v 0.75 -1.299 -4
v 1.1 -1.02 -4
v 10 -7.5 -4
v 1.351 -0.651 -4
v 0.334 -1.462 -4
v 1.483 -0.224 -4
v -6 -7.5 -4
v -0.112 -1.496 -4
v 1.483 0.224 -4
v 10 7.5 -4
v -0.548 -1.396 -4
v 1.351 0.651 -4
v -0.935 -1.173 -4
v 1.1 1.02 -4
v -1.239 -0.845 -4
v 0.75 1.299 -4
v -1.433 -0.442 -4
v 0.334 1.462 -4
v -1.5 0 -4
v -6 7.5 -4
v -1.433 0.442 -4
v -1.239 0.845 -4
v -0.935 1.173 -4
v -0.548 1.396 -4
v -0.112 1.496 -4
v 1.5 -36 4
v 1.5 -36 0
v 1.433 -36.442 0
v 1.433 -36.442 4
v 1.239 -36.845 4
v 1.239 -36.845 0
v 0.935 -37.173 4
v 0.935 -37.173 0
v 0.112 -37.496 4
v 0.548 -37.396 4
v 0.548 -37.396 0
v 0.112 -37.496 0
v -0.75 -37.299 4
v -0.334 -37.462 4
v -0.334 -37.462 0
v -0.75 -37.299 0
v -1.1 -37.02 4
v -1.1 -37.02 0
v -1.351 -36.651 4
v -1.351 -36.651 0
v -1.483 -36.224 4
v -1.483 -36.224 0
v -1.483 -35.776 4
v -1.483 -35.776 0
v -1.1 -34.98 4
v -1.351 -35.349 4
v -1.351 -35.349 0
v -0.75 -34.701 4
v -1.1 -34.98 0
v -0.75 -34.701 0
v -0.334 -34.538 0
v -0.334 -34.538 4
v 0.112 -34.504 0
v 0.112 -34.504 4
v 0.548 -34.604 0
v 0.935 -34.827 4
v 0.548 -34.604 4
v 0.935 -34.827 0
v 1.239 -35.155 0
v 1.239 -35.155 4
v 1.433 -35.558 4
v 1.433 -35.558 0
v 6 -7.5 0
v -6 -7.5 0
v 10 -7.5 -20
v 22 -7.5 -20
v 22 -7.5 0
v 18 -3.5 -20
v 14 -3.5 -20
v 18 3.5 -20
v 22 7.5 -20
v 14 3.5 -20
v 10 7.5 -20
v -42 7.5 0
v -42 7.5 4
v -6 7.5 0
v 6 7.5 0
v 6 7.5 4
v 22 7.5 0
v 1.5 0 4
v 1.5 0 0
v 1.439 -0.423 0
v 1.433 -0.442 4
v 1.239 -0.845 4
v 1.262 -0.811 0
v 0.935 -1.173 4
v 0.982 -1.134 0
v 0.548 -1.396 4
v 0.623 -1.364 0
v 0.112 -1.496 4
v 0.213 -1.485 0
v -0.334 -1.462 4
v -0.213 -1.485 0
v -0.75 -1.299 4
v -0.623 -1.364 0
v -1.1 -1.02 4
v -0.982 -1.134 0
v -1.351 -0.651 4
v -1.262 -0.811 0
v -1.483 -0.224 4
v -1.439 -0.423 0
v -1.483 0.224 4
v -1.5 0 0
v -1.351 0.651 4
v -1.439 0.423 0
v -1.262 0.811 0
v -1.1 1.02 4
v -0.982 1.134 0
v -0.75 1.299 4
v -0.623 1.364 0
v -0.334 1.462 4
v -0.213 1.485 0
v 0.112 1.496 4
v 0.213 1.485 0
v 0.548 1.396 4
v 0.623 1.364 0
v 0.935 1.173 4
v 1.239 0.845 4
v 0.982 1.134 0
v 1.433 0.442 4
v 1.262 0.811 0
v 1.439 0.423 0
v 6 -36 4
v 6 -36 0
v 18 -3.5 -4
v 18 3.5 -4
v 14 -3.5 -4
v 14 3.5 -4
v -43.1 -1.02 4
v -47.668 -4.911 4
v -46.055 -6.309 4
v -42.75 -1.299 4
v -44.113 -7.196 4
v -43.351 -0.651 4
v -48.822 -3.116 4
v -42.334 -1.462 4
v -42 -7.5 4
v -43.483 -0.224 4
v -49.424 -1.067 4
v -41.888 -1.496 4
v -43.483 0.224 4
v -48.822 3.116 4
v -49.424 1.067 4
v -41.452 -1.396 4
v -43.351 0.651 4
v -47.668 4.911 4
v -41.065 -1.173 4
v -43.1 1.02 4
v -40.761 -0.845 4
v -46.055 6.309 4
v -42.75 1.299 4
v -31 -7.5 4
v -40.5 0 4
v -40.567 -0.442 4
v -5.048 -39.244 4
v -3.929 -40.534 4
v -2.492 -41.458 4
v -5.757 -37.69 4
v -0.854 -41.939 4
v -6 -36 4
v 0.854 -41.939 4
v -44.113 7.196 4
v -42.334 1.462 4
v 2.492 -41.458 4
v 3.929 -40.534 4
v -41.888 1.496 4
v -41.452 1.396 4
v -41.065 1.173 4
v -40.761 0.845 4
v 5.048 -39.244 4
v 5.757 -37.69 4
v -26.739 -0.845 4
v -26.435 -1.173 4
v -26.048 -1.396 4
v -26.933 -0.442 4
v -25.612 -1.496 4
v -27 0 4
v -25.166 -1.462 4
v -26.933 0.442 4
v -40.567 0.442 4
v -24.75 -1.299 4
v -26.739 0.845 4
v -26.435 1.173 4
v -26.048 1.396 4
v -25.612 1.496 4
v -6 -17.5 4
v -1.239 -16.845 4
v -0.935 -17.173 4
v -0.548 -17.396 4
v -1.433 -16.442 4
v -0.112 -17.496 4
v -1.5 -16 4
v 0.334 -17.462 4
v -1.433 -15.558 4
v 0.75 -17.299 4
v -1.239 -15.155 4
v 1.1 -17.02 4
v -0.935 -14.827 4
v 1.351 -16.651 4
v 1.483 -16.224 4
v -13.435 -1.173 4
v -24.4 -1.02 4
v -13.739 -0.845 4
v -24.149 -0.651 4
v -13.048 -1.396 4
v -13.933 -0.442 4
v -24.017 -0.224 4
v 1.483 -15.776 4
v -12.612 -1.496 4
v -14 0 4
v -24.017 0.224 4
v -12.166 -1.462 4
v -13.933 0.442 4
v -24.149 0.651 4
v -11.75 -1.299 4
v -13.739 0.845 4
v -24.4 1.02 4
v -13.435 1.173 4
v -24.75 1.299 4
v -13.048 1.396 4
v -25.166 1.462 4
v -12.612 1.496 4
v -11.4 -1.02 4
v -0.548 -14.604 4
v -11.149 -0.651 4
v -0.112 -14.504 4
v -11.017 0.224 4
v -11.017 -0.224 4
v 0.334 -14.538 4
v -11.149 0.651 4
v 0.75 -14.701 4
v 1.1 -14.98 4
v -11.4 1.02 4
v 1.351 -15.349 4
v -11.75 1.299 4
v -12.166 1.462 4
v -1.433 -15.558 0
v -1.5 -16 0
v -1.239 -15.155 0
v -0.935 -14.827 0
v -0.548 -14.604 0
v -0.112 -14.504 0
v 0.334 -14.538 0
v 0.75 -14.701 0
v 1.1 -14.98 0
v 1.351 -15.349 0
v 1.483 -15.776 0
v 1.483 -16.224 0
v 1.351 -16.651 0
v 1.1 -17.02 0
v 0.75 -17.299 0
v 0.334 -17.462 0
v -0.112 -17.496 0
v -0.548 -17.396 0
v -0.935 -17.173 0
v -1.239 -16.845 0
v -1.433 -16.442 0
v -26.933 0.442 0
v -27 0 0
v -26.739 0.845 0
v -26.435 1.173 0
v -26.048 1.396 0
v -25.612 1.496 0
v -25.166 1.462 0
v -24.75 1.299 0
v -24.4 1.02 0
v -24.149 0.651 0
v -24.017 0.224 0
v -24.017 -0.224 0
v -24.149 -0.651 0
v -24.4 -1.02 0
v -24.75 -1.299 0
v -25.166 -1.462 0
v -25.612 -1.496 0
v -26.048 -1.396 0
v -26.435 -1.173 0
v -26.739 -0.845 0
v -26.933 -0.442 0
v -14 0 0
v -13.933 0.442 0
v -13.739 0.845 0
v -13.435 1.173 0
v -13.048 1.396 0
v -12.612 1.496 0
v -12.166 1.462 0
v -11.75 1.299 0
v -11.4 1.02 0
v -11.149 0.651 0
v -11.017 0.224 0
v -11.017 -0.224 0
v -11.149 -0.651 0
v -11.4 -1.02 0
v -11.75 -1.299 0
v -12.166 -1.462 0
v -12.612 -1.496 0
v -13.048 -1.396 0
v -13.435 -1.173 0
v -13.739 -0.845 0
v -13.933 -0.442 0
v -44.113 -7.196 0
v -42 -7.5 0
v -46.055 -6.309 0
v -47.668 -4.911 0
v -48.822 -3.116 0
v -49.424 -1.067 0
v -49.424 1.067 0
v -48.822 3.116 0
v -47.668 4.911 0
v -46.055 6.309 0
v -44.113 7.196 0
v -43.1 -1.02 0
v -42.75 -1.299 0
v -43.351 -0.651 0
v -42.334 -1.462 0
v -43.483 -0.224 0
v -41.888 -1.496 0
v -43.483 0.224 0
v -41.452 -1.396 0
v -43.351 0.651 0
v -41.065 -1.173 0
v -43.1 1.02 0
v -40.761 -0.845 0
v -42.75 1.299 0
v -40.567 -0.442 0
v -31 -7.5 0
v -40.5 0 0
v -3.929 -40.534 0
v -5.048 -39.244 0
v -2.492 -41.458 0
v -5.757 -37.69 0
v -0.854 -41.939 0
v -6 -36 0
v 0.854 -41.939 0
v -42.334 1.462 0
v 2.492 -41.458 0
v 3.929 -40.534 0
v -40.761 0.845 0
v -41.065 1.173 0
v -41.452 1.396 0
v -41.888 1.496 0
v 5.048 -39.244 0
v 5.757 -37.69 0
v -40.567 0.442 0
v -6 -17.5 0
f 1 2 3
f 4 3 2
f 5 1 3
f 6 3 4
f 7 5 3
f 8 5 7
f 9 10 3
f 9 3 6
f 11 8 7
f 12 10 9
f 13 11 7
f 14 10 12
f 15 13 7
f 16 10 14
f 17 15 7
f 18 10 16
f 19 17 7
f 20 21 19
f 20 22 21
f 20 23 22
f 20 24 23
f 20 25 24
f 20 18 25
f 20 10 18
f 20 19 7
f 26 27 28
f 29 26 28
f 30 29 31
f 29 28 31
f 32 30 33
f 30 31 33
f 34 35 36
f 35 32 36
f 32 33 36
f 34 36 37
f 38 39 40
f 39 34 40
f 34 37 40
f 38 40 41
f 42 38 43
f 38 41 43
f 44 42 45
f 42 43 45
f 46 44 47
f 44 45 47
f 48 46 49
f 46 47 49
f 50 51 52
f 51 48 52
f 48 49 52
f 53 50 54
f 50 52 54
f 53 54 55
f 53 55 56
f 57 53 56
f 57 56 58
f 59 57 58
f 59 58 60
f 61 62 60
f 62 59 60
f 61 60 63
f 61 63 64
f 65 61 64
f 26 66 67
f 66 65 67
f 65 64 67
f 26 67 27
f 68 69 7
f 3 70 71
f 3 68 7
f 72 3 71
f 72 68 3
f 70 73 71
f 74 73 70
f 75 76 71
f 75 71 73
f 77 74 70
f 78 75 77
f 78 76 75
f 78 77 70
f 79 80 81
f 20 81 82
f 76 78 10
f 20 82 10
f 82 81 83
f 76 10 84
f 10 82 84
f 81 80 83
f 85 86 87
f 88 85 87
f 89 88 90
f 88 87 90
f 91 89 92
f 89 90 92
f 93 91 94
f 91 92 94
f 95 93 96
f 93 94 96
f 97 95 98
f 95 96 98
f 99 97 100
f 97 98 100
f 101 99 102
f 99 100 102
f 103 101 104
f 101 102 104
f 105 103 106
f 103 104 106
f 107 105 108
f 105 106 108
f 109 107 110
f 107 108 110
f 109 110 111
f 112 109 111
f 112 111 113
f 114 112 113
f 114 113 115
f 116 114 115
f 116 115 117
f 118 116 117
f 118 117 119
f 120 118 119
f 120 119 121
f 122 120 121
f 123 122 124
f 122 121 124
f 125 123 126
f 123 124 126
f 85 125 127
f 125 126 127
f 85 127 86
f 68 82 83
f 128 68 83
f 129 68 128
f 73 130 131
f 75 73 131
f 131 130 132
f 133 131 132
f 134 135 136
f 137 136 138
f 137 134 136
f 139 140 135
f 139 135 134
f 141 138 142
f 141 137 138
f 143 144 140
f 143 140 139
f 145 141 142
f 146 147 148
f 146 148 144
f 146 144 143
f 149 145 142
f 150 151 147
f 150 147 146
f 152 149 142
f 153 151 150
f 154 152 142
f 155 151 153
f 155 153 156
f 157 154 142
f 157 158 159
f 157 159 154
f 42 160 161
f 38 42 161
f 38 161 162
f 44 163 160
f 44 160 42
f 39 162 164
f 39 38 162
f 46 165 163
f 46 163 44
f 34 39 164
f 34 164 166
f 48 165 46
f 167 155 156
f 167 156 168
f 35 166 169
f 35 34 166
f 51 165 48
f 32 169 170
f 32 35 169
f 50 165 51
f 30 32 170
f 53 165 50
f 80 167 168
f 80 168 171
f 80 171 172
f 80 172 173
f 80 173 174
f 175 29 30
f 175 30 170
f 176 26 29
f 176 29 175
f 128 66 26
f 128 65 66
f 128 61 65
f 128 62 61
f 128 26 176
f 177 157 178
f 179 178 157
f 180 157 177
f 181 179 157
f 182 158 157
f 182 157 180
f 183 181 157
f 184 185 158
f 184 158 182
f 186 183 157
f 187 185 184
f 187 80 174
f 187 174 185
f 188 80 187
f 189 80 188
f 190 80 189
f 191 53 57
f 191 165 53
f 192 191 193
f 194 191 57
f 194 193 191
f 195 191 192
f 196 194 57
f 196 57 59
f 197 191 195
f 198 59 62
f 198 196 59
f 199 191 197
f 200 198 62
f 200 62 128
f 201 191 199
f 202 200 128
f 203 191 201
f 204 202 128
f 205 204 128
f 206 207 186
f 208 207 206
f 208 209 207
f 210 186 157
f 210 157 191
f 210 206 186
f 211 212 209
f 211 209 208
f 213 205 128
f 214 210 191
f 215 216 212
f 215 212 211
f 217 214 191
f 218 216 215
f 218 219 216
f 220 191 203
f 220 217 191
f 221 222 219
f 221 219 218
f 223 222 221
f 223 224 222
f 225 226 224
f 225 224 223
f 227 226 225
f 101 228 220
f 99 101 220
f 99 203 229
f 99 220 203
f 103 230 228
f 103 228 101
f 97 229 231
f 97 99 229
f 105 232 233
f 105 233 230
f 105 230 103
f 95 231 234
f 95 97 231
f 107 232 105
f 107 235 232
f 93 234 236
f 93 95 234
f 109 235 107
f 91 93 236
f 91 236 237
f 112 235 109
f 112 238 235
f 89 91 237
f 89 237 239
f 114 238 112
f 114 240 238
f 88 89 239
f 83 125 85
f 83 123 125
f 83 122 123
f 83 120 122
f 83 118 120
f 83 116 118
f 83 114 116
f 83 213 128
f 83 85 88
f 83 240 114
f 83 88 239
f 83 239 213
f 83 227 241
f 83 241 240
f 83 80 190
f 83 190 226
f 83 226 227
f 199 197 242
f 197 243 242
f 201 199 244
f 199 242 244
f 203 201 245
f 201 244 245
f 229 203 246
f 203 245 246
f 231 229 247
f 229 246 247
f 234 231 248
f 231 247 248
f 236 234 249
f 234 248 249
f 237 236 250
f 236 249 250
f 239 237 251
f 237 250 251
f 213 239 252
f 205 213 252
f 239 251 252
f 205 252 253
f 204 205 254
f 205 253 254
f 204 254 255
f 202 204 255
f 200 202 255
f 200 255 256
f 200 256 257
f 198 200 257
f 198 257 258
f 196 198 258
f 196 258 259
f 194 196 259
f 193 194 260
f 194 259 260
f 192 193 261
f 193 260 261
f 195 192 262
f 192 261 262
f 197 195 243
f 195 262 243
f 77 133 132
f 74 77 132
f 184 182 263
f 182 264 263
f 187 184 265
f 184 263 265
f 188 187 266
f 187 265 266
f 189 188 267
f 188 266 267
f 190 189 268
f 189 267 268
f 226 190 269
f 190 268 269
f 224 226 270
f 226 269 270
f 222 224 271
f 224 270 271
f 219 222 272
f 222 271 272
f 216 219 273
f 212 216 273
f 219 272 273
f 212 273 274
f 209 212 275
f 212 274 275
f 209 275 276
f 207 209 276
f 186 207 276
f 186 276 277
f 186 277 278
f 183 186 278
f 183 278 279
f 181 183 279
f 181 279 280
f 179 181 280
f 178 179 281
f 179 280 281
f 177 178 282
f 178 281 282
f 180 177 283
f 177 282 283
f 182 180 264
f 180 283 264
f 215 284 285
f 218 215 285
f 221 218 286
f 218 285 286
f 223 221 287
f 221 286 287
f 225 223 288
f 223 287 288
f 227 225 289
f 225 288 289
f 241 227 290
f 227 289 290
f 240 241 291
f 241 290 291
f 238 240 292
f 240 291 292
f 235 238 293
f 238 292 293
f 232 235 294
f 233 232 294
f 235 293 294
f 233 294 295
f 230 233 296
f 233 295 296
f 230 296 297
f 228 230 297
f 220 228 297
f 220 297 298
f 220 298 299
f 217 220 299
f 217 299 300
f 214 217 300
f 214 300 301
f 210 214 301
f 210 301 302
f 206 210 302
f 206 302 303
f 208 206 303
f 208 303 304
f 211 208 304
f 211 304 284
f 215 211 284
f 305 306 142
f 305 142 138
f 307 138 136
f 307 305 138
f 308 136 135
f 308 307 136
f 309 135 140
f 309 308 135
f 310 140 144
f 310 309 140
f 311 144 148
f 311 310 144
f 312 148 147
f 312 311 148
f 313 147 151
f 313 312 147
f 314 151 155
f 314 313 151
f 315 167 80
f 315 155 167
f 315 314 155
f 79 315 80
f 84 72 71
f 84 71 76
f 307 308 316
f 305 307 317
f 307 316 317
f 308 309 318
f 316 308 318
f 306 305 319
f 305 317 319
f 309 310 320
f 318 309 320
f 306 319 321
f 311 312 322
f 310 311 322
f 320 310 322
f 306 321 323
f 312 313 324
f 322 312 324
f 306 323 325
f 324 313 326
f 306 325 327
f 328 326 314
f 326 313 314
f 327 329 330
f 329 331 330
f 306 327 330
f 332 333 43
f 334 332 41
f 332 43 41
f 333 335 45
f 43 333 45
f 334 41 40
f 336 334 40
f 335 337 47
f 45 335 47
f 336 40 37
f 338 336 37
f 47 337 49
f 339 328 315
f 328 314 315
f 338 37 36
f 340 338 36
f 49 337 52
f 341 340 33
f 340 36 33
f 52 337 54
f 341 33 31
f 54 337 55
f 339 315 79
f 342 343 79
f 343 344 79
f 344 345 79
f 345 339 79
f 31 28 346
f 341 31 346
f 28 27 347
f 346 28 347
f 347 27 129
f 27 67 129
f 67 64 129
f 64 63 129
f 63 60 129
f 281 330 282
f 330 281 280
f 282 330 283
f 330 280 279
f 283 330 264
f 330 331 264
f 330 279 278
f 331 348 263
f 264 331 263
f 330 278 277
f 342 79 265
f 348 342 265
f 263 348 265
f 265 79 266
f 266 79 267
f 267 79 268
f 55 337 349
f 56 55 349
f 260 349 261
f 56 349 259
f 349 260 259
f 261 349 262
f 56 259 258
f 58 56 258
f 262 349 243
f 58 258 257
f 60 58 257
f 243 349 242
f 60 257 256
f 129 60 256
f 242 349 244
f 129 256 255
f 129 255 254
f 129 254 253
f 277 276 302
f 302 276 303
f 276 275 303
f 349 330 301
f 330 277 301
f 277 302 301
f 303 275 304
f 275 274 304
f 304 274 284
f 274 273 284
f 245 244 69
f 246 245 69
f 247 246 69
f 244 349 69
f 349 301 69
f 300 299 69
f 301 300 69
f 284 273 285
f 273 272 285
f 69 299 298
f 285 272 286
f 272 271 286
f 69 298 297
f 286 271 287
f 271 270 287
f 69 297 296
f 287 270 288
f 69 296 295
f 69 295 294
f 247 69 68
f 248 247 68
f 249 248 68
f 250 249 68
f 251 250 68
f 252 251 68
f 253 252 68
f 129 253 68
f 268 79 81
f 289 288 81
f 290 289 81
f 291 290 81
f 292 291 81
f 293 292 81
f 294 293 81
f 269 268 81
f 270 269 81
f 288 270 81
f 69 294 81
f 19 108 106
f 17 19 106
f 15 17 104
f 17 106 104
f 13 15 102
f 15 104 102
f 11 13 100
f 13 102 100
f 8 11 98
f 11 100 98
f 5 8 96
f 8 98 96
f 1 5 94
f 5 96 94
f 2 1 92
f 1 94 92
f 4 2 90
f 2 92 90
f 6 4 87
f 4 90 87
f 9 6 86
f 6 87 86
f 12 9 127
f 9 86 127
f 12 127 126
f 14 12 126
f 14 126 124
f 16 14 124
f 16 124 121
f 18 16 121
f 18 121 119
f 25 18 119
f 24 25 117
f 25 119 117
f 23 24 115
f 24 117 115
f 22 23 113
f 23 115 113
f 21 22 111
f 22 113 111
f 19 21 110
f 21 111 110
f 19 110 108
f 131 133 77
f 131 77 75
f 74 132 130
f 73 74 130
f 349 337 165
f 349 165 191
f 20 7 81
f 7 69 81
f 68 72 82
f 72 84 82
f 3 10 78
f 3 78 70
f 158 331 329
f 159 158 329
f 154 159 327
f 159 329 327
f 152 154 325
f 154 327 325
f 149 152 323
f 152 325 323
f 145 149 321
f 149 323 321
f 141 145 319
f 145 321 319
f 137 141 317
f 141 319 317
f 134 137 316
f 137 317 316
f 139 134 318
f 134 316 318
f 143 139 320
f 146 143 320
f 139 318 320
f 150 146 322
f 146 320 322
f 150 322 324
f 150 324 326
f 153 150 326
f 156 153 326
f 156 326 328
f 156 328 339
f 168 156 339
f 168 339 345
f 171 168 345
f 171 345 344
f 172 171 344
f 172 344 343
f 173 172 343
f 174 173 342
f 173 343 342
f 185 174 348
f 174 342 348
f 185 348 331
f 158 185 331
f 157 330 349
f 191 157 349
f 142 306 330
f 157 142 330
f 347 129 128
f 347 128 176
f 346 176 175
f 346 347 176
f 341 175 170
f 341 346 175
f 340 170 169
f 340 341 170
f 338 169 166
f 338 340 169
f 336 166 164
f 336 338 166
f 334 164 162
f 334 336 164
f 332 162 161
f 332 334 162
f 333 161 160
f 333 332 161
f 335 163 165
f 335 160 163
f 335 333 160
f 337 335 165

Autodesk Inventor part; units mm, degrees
ref_plane "YZ Plane" through (0, 0, 0) normal (1, 0, 0) x (0, 1, 0)
ref_plane "XZ Plane" through (0, 0, 0) normal (0, 1, 0) x (-1, 0, 0)
ref_plane "XY Plane" through (0, 0, 0) normal (0, 0, 1) x (1, 0, 0)
sketch "Sketch1" plane through (0, 0, 0) normal (0, 0, 1) x (1, 0, 0)
  circle A0 centre (0, 0) radius 1.5
  circle A1 centre (-42, 0) radius 1.5
  circle A2 centre (0, -36) radius 1.5
  arc A3 (-42, 7.5) -> (-42, -7.5) centre (-42, 0) ccw
  line L0 (-42, 1.5) -> (-42, -1.5)
  arc A4 (-6, -36) -> (6, -36) centre (0, -36) ccw
  line L1 (-42, 7.5) -> (6, 7.5)
  line L2 (6, 7.5) -> (6, -36)
  line L3 (-6, -36) -> (-6, -17.5)
  line L4 (-42, -7.5) -> (-31, -7.5)
  line L5 (-31, -7.5) -> (-6, -17.5)
  dimension "d0" = 3
  dimension "d1" = 3
  dimension "d2" = 3
  dimension "d3" = 15
  dimension "d5" = 15
  dimension "d6" = 12
  dimension "d7" = 48
extrude "Extrusion1" add sketch "Sketch1" along normal blind 4
sketch "Sketch2" plane through (0, 0, 0) normal (0, 0, -1) x (-1, 0, 0)
  line L0 (6, 7.5) -> (-22, 7.5)
  line L1 (-22, -7.5) -> (6, -7.5)
  line L2 (6, -7.5) -> (6, 7.5)
  line L3 (-22, 7.5) -> (-22, -7.5)
  circle A0 centre (0, 0) radius 1.5
  dimension "d27" = 28
  dimension "d28" = 15
  dimension "d29" = 28
  dimension "d30" = 6
  dimension "d31" = 7.5
  dimension "d32" = 3
extrude "Extrusion4" add sketch "Sketch2" along normal blind 4
sketch "Sketch5" plane through (0, 0, -4) normal (0, 0, -1) x (-1, 0, 0)
  line L0 (-6, 7.5) -> (-22, 7.5) projected
  line L1 (-22, 7.5) -> (-10, 7.5)
  line L2 (-10, 7.5) -> (-10, -7.5)
  line L3 (-10, -7.5) -> (-22, -7.5)
  line L4 (-22, -7.5) -> (-22, 7.5)
  point P0 (0, 0)
  dimension "d35" = 12
  dimension "d36" = 15
extrude "Extrusion5" add sketch "Sketch5" along normal blind 16
shell "Shell2" thickness 4 removed faces 1 at (18, 2.5, -20)
sketch "Sketch6" plane through (0, 0, 0) normal (0, 0, -1) x (-1, 0, 0)
  circle A0 centre (12.5, 0) radius 1.5
  line L0 (6, 7.5) -> (-10, 7.5) projected
  point P0 (0, 0)
  dimension "d40" = 3
  dimension "d41" = 12.5
  dimension "d42" = 7.5
sketch "Sketch7" plane through (0, 0, 0) normal (0, 0, -1) x (-1, 0, 0)
  point P0 (0, 0)
extrude "Extrusion6" cut sketch "Sketch6" against normal through all
sketch "Sketch8" plane through (0, 0, 0) normal (0, 0, -1) x (-1, 0, 0)
  circle A0 centre (25.5, 0) radius 1.5
  circle A1 centre (12.5, 0) radius 1.5 projected
  line L0 (6, 7.5) -> (-10, 7.5) projected
  point P0 (0, 0)
  dimension "d45" = 3
  dimension "d46" = 13
  dimension "d47" = 7.5
extrude "Extrusion7" cut sketch "Sketch8" against normal through all contours A0
sketch "Sketch9" plane through (0, 0, 0) normal (0, 0, -1) x (-1, 0, 0)
  point P0 (0, 0)
sketch "Sketch10" plane through (0, 0, 0) normal (0, 0, -1) x (-1, 0, 0)
  circle A0 centre (0, -16) radius 1.5
  line L0 (6, -36) -> (6, -17.5) projected
  circle A1 centre (0, -36) radius 1.5 projected
  point P0 (0, 0)
  dimension "d50" = 3
  dimension "d51" = 6
  dimension "d52" = 20
extrude "Extrusion8" cut sketch "Sketch10" against normal through all contours A0
properties part number "Mounting Bracket 2of4 - Copy2"
